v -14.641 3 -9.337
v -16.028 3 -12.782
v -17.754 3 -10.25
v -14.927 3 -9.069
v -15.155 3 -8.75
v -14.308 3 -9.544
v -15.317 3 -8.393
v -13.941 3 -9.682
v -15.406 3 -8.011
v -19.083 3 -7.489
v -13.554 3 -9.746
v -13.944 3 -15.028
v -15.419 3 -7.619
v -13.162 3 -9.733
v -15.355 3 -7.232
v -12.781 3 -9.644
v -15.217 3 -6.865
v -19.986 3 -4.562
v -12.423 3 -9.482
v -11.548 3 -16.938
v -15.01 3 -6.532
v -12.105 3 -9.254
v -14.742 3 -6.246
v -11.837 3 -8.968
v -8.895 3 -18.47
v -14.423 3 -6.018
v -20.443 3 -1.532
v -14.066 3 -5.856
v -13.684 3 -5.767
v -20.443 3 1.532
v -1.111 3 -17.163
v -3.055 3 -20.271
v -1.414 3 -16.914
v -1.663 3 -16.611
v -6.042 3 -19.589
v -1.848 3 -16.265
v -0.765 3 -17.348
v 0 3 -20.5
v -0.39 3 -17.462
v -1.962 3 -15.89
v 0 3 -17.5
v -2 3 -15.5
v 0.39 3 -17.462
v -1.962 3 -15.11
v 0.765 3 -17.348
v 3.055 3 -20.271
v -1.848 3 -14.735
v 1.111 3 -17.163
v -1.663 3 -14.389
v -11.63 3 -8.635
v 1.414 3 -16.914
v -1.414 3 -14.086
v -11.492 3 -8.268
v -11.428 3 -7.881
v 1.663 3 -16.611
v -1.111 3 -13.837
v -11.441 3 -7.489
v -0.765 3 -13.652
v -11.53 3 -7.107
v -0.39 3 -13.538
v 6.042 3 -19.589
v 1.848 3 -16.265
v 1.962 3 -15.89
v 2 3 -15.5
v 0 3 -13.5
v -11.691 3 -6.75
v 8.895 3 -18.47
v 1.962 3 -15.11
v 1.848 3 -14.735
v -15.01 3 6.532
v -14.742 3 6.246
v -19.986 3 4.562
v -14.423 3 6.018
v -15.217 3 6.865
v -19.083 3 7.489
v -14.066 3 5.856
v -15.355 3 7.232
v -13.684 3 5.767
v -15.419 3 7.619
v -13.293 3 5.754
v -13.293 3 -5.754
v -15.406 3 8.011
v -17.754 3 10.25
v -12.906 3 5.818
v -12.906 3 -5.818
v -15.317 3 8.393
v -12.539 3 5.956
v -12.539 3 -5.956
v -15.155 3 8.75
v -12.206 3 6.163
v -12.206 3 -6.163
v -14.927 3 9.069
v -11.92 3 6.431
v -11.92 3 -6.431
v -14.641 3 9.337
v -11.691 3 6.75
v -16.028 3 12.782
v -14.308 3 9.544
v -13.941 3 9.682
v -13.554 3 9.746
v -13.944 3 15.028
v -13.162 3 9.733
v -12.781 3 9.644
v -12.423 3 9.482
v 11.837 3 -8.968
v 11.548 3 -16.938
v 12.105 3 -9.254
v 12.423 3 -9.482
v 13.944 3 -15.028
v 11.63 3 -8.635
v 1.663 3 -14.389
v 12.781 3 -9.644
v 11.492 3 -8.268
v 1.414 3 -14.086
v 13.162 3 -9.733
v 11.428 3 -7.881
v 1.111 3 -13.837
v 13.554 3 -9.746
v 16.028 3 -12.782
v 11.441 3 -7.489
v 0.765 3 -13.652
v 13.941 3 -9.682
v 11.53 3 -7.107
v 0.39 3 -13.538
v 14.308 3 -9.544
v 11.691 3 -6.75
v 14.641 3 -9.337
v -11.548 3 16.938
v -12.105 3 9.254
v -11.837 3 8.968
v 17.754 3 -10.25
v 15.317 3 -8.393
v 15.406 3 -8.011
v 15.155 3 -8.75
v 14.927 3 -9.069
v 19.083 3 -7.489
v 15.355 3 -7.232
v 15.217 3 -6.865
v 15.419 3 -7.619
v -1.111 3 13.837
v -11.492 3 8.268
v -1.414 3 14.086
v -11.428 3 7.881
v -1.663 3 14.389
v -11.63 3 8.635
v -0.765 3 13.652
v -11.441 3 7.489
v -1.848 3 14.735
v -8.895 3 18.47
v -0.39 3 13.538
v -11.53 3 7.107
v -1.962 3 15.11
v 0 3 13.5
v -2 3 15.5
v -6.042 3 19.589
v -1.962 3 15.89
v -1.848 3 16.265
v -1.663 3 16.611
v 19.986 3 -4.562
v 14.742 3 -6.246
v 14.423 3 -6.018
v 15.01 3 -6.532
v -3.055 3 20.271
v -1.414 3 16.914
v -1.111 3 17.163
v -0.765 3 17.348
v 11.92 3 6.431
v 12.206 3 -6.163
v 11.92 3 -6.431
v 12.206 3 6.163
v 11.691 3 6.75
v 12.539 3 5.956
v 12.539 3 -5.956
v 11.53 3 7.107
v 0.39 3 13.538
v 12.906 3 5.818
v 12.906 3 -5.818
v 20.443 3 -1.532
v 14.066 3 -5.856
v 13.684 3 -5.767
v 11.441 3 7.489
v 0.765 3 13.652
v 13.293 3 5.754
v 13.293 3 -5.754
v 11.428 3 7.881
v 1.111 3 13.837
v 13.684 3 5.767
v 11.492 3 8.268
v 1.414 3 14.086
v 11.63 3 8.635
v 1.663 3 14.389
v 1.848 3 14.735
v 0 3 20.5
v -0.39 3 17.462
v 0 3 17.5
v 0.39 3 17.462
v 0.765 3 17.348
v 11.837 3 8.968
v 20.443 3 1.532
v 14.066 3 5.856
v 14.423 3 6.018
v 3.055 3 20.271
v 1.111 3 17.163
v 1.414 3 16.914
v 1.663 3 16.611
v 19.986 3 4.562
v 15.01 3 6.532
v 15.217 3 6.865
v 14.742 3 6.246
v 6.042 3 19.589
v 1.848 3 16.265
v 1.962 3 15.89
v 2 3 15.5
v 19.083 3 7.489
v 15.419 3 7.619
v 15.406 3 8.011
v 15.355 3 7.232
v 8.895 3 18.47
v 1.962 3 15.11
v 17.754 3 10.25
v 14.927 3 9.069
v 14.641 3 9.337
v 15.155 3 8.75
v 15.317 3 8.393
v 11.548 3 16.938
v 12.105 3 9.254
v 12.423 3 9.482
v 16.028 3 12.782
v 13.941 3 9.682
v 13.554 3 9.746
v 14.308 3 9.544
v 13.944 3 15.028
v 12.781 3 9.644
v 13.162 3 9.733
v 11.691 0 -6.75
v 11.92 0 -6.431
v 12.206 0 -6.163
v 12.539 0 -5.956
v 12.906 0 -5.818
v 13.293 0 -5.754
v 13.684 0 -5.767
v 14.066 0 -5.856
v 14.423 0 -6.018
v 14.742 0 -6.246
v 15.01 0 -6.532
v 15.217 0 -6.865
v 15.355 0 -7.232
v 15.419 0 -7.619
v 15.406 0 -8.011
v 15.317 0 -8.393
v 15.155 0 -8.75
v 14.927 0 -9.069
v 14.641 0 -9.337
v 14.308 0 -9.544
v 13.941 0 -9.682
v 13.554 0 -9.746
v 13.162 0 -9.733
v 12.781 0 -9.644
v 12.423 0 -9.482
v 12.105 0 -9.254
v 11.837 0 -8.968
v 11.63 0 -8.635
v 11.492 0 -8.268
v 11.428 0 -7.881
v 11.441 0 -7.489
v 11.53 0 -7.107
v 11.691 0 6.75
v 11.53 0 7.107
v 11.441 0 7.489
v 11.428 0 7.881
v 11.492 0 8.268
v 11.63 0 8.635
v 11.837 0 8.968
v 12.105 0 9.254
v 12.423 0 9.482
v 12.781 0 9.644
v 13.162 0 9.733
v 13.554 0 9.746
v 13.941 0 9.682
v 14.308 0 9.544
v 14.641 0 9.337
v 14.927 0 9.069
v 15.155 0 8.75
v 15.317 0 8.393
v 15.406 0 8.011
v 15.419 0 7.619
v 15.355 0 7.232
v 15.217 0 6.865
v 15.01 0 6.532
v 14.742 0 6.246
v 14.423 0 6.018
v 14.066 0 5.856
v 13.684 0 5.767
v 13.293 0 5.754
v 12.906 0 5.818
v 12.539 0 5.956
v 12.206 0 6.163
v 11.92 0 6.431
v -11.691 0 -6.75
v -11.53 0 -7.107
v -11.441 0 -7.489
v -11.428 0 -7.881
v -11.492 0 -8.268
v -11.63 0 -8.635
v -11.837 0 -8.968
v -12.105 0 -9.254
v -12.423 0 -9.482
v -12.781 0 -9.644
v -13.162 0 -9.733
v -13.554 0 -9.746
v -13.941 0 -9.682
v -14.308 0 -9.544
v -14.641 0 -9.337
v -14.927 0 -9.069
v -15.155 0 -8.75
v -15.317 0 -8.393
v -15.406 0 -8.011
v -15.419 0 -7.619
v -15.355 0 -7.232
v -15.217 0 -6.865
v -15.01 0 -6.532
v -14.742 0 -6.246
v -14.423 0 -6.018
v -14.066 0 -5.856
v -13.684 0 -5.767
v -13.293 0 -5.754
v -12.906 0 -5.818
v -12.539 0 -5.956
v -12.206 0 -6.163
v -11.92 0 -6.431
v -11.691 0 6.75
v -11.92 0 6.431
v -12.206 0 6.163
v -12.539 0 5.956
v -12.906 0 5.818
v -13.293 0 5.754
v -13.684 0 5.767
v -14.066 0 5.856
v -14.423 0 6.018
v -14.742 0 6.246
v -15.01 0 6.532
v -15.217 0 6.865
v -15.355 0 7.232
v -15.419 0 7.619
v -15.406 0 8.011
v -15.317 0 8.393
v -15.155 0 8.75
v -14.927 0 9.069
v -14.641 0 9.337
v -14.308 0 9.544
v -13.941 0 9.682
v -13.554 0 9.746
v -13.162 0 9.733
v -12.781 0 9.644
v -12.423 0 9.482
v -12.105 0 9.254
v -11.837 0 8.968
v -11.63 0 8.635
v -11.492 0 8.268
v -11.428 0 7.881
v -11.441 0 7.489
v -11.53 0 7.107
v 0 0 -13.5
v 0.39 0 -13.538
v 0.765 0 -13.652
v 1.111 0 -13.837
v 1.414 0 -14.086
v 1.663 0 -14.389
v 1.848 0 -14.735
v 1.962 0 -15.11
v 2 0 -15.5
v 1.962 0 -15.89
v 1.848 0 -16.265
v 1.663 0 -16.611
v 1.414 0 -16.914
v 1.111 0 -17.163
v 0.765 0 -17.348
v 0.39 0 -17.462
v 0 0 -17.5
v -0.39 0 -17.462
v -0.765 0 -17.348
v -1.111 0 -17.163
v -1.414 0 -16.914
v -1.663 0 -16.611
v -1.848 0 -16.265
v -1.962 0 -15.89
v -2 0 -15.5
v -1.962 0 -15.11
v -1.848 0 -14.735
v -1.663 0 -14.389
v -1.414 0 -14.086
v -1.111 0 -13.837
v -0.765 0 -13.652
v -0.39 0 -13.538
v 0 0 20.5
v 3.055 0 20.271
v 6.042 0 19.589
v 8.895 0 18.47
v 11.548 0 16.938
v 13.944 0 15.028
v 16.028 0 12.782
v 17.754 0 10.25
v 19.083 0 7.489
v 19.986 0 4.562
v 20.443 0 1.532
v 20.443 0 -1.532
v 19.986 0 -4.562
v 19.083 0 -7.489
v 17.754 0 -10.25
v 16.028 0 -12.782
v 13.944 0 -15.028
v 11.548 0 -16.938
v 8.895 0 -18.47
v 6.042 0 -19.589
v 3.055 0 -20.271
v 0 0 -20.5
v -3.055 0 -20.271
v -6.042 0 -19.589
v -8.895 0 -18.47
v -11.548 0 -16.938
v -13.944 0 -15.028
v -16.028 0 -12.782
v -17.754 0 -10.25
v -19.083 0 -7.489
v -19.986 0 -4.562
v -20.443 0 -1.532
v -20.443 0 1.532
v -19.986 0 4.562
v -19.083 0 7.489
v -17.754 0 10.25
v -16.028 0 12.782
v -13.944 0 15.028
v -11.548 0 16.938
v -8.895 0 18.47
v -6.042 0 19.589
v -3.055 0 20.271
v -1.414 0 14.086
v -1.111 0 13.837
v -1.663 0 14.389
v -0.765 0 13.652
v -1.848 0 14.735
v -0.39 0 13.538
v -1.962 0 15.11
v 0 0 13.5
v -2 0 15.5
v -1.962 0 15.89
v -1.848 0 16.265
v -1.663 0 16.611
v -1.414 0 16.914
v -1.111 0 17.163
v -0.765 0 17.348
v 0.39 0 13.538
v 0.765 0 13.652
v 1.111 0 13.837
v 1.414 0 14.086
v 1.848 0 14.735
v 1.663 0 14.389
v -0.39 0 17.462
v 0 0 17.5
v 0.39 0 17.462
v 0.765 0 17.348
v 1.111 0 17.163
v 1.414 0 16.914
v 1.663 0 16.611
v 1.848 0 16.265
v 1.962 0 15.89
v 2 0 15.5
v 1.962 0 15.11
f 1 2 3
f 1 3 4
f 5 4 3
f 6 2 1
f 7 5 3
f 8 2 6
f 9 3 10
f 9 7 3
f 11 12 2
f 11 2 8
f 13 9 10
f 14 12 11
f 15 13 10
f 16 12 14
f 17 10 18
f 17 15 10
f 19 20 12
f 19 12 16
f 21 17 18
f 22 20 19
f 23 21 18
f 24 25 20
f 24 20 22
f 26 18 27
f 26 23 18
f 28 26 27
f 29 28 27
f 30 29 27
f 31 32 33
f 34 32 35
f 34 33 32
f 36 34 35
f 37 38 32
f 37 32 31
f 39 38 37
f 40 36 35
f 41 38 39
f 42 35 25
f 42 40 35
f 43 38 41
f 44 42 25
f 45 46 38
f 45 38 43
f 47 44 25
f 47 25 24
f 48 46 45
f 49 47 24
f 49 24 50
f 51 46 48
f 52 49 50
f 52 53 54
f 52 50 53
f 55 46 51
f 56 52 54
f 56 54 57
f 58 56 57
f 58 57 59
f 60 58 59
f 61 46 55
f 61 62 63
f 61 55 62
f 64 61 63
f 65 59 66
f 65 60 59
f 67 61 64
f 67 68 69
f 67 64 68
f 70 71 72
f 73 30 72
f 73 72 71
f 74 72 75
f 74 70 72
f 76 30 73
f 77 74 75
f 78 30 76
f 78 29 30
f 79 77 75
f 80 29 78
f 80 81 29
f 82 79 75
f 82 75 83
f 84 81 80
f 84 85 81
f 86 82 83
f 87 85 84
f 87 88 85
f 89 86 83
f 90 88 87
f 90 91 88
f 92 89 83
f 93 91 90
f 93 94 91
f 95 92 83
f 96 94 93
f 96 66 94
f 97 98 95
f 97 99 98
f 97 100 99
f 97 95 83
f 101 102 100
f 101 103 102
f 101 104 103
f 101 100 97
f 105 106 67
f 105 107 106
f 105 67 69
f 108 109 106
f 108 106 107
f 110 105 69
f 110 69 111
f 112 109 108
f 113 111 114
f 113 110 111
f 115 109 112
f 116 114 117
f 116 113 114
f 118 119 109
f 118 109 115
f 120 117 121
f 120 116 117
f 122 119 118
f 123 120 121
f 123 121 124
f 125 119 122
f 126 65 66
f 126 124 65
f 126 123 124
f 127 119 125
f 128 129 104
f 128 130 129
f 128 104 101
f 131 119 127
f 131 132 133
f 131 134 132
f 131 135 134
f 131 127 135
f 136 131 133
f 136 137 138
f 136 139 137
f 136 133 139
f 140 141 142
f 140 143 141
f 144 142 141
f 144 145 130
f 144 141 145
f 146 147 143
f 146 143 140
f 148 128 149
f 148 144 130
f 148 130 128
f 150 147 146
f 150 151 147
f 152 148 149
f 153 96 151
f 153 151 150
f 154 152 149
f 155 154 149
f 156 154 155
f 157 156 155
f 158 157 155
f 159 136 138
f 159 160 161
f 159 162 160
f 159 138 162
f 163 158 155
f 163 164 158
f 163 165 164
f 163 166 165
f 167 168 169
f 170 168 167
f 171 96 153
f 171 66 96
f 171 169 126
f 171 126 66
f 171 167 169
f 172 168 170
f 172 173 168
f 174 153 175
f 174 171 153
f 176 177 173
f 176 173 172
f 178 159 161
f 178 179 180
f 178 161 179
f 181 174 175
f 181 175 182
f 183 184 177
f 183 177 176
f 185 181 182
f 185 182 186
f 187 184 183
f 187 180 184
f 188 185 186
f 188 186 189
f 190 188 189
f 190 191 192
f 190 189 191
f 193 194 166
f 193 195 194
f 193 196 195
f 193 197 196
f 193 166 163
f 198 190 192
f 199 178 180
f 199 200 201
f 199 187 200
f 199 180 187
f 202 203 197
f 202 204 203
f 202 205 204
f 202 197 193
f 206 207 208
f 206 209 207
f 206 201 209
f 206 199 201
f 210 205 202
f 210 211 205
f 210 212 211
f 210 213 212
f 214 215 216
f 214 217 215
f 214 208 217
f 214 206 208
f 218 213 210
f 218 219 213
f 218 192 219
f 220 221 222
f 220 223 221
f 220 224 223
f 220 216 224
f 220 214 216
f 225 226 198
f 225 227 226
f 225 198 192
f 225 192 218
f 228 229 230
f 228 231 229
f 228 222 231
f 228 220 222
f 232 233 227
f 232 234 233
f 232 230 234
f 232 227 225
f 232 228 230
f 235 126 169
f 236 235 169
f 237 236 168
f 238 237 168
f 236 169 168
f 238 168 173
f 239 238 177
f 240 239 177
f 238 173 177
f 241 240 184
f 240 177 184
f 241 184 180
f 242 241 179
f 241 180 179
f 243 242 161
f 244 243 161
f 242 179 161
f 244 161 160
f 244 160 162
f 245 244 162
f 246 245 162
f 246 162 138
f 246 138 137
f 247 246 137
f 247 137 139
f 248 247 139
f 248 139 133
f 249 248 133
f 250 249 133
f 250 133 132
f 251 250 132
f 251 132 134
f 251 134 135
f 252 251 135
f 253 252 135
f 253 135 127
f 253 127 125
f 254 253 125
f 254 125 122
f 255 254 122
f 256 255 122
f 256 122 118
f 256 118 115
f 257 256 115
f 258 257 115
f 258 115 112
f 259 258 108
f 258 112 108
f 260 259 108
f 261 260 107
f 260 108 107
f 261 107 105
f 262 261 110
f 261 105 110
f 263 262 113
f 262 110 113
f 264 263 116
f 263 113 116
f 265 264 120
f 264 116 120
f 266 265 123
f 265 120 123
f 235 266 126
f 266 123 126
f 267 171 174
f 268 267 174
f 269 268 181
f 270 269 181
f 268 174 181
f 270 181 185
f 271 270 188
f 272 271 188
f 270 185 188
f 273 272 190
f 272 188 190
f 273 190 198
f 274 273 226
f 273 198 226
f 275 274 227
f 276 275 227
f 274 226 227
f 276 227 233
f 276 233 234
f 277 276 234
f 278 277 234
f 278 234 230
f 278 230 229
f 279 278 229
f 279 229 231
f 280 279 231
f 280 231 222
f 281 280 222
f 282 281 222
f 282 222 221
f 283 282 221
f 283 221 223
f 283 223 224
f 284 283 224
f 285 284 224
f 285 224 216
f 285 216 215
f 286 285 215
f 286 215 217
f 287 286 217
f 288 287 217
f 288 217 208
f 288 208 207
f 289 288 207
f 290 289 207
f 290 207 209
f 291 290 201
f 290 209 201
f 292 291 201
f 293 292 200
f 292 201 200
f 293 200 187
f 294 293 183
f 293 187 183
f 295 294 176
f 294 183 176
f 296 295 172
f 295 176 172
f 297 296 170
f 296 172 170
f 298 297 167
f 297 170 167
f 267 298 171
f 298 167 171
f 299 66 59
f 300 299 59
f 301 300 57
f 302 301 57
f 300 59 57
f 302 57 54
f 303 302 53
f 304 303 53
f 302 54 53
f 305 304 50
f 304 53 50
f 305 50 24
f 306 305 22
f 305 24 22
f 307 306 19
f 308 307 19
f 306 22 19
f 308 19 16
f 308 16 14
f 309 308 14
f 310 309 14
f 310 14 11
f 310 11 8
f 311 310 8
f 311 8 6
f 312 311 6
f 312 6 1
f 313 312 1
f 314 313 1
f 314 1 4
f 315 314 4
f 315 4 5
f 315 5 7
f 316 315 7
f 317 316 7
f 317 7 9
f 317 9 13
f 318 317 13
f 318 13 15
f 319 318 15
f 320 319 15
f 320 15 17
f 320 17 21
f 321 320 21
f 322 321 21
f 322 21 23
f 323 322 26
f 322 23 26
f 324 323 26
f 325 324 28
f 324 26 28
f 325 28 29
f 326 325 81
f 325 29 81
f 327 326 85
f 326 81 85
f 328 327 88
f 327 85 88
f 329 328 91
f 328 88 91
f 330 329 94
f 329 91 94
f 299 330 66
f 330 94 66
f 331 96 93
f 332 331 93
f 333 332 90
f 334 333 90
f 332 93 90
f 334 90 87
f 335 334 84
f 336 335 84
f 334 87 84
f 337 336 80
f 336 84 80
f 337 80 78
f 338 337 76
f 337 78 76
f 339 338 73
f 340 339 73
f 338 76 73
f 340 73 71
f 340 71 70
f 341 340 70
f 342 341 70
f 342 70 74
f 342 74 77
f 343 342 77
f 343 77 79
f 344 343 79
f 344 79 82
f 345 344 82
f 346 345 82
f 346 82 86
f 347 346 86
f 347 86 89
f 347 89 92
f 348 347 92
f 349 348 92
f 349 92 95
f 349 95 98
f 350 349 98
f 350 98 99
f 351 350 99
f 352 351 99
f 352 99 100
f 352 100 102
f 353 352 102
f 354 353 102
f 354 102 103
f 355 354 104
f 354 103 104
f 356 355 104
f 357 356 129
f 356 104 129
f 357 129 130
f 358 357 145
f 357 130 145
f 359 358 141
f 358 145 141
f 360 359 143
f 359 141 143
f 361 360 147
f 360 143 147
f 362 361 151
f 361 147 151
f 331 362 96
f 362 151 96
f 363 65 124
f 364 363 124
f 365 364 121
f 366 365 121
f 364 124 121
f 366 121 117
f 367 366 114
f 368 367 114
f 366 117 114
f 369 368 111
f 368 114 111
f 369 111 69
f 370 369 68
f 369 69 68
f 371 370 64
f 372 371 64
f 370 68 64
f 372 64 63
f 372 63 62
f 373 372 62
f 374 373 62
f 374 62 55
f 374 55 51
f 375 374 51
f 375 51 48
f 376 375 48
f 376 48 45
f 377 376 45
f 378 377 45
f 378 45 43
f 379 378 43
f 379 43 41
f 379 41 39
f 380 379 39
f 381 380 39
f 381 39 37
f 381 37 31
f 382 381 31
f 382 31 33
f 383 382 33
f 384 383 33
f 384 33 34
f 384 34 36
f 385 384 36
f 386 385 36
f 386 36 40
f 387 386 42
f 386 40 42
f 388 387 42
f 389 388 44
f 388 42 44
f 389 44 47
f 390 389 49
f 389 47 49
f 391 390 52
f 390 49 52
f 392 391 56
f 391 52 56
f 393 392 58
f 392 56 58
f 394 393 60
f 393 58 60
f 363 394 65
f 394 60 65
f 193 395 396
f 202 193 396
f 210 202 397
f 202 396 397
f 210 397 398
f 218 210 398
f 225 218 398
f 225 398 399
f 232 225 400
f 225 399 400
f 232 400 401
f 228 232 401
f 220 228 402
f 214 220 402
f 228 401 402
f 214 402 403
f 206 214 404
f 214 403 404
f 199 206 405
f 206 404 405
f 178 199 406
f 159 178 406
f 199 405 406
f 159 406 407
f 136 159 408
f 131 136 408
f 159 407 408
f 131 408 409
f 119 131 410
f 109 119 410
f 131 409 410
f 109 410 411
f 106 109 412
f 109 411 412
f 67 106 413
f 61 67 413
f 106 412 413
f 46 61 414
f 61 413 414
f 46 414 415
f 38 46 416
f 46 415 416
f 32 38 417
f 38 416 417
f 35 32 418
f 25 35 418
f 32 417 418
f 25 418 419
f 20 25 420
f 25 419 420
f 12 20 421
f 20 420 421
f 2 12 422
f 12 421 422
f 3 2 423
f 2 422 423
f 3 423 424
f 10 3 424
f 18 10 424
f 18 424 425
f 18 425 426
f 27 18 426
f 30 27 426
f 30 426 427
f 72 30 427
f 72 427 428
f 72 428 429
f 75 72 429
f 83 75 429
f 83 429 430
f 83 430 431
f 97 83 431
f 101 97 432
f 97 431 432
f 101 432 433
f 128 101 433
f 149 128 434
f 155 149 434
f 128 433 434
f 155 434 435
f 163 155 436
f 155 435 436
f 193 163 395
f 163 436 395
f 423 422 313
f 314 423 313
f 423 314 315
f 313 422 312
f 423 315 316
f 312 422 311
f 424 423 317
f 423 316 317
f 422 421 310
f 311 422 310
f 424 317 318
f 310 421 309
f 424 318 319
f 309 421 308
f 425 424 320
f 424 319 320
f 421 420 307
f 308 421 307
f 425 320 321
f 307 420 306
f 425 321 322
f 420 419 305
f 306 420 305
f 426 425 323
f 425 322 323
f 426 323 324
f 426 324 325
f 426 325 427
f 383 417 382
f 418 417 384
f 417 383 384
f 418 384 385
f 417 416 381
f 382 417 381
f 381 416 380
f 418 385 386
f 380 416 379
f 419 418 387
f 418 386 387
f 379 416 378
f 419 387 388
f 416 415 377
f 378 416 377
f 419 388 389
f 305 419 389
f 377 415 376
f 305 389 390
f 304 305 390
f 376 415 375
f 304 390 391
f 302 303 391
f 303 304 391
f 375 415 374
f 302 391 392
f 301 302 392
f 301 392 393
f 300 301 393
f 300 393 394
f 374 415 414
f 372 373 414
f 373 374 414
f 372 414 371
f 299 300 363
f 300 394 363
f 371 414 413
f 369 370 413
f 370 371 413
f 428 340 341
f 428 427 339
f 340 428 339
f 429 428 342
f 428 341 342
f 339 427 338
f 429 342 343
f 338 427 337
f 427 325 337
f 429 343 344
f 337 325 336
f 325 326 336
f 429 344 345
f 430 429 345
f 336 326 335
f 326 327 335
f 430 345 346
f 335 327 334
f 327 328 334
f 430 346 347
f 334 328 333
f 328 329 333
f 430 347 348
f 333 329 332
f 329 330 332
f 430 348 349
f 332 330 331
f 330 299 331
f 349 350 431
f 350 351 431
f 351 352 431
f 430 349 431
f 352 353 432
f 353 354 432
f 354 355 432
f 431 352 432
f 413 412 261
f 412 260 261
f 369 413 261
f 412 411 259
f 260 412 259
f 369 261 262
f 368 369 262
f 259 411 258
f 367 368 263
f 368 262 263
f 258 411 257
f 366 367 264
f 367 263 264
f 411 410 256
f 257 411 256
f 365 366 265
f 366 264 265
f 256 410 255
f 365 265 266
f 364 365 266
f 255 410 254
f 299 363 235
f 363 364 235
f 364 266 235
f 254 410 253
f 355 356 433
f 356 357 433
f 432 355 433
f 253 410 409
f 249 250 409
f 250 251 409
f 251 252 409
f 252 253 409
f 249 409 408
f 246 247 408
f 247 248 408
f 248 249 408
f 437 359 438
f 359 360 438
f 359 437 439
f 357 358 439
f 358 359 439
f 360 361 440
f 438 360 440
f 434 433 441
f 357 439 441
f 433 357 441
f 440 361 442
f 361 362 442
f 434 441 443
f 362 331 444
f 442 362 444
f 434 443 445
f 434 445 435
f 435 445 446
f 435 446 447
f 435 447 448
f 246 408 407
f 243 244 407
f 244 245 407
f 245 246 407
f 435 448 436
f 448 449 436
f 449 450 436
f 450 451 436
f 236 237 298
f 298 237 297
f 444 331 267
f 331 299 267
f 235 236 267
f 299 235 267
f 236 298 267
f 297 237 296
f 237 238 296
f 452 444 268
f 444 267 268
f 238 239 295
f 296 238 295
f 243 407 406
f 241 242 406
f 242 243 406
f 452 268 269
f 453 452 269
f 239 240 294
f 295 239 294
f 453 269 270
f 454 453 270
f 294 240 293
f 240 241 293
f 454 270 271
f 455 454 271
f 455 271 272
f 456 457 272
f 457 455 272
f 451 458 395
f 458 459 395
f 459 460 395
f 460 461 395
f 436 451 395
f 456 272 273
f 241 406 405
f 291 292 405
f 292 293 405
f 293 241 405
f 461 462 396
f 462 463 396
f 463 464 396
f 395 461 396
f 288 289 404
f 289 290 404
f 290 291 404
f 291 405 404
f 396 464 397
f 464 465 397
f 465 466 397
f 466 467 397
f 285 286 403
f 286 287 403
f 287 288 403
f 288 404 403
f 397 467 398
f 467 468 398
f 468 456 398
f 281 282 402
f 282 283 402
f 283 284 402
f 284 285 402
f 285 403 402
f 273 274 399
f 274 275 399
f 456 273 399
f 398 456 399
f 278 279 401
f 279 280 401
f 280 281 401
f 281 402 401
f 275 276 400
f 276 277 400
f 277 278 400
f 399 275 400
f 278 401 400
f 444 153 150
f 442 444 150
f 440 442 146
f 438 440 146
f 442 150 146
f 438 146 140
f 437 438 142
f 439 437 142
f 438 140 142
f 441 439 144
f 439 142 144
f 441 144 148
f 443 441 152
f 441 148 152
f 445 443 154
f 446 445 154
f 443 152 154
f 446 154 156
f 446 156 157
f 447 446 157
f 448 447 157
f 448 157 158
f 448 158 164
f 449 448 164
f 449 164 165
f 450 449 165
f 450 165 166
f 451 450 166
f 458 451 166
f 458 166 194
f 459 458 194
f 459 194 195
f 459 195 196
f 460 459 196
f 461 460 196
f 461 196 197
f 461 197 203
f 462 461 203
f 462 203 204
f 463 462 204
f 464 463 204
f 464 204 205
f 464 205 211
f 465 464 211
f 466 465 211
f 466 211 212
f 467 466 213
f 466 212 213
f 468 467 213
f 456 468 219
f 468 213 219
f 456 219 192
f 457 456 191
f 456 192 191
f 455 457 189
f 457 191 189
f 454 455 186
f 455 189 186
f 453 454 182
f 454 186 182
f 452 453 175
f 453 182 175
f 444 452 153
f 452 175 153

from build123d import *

# Parameters (mm, degrees)
SKETCH_1_R               = 20.5
EXTRUDE_1_DEPTH          = 3
CUT_EXTRUDE_1_REACH      = 31.146
SKETCH_2_R               = 2
PATTERN_CIRCULAR_1_COUNT = 6


with BuildPart() as part:
    # 草圖1 → 填料-伸長1 (new body)
    with BuildSketch(Plane(origin=(0, 0, 0), x_dir=(1, 0, 0), z_dir=(0, 1, 0))):
        with Locations(Location((0, 0, 0), (0, 0, 270))):
            Circle(SKETCH_1_R)
    extrude(amount=EXTRUDE_1_DEPTH)

    # 草圖2 → 除料-伸長1 (cut, up to next)
    with BuildSketch(Plane(origin=(0, 3, 0), x_dir=(1, 0, 0), z_dir=(0, 1, 0)), mode=Mode.PRIVATE) as cut_extrude_1_sk1:
        with Locations(Location((0, 15.5, 0), (0, 0, 270))):
            Circle(SKETCH_2_R)
    cut_extrude_1_tool1 = extrude(cut_extrude_1_sk1.sketch, amount=-CUT_EXTRUDE_1_REACH, mode=Mode.PRIVATE) & part.part
    cut_extrude_1 = cut_extrude_1_tool1.solids().sort_by_distance((0, 3, -15.5))[0]
    add(cut_extrude_1, mode=Mode.SUBTRACT)

    # 環狀複製排列1: 除料-伸長1 ×6 about axis
    pattern_circular_1_axis = Axis((0, 0, 0), (0, 1, 0))
    for i in range(1, PATTERN_CIRCULAR_1_COUNT):
        add(cut_extrude_1.rotate(pattern_circular_1_axis, i * 360 / PATTERN_CIRCULAR_1_COUNT), mode=Mode.SUBTRACT)


solid = part.part
